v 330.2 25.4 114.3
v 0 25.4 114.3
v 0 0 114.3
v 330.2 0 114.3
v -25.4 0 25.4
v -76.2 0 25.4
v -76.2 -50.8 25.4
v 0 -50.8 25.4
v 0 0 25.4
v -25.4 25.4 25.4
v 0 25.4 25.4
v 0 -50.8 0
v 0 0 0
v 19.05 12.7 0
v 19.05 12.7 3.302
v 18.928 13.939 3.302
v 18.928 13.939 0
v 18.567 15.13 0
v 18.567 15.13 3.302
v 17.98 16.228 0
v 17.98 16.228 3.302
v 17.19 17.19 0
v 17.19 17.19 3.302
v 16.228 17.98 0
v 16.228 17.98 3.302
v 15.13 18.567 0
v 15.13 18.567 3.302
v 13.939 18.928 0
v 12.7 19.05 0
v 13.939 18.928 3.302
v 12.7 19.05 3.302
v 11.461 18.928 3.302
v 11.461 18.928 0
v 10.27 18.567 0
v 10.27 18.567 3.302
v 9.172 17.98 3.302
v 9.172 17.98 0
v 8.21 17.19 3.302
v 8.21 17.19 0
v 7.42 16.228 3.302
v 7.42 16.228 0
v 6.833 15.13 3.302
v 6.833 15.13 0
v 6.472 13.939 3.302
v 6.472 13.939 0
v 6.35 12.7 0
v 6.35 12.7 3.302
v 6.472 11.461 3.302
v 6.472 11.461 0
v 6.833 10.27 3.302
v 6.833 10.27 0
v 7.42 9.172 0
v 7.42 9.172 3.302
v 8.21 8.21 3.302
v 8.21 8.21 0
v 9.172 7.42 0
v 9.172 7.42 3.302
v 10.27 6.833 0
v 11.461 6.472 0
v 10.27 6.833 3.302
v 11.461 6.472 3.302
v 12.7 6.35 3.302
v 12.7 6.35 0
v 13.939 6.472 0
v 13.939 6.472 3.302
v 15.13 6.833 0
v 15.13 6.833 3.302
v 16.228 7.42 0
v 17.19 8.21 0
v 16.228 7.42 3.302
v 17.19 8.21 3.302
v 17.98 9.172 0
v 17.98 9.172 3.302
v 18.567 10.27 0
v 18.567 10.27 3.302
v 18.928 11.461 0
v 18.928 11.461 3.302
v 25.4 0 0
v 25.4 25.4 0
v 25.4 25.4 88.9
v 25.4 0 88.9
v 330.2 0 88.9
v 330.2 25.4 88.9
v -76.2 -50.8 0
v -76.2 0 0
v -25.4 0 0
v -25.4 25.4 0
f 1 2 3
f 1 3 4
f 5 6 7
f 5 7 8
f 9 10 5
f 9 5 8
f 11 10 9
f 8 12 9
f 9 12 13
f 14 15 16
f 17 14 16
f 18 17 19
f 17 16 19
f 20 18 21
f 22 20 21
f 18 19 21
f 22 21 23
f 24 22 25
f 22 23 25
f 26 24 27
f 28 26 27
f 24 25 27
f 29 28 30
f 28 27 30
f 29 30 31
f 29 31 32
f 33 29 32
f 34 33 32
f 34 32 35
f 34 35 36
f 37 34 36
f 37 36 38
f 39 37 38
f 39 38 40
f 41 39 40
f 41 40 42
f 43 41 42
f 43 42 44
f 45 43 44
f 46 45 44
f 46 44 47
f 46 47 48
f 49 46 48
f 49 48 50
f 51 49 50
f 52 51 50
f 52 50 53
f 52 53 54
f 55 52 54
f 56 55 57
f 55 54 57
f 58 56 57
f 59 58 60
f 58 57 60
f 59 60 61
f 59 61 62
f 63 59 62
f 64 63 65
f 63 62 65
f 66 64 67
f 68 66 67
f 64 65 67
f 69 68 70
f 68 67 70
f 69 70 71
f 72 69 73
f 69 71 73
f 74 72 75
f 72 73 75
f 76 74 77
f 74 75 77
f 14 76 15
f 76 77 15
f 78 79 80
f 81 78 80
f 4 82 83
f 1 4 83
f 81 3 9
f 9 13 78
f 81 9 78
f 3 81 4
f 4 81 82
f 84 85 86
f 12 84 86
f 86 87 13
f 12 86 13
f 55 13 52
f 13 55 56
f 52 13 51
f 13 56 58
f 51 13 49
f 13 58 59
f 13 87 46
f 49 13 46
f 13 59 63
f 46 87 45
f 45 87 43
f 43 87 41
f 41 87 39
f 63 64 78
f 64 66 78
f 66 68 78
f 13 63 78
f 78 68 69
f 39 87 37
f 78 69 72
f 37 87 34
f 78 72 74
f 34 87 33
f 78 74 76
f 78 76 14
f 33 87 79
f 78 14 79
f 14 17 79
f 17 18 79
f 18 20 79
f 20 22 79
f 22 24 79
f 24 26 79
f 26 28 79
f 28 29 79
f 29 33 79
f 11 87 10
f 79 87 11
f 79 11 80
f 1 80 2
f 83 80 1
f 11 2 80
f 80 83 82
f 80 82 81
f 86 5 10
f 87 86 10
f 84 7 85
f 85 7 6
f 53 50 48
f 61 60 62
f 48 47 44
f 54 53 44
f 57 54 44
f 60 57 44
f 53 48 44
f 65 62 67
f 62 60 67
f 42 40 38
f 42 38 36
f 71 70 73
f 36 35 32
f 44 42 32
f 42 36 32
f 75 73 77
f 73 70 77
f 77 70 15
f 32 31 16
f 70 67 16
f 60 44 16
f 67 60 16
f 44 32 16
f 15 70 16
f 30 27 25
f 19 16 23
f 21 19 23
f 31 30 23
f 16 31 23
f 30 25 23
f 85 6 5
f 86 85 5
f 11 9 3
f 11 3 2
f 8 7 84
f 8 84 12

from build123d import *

# Parameters (mm, degrees)
SKETCH1_W           = 406.4
SKETCH1_H           = 76.2
BOSS_EXTRUDE1_DEPTH = 25.4
SKETCH2_W           = 330.2
SKETCH2_H           = 50.8
CUT_EXTRUDE1_DEPTH  = 336.04901134
SKETCH3_W           = 330.2
SKETCH3_H           = 25.4
BOSS_EXTRUDE2_DEPTH = 88.9
SKETCH4_W           = 50.8
SKETCH4_H           = 25.4
CUT_EXTRUDE2_DEPTH  = 346.710702756
SKETCH5_W           = 304.8
SKETCH5_H           = 88.9
CUT_EXTRUDE3_DEPTH  = 358.635247144
HOLE1_D             = 12.7
HOLE1_DEPTH         = 3.302


with BuildPart() as part:
    # Sketch1 → Boss-Extrude1 (new body)
    with BuildSketch(Plane.XY.offset(25.4)):
        with Locations((127, -12.7)):
            Rectangle(SKETCH1_W, SKETCH1_H)
    extrude(amount=-BOSS_EXTRUDE1_DEPTH)

    # Sketch2 → Cut-Extrude1 (cut, through all)
    with BuildSketch(Plane(origin=(0, 0, 0), x_dir=(-1, 0, 0), z_dir=(0, 0, -1))):
        with Locations((-165.1, -25.4)):
            Rectangle(SKETCH2_W, SKETCH2_H)
    extrude(amount=-CUT_EXTRUDE1_DEPTH, mode=Mode.SUBTRACT)

    # Sketch3 → Boss-Extrude2 (add)
    with BuildSketch(Plane.XY.offset(25.4)):
        with Locations((165.1, 12.7)):
            Rectangle(SKETCH3_W, SKETCH3_H)
    extrude(amount=BOSS_EXTRUDE2_DEPTH)

    # Sketch4 → Cut-Extrude2 (cut, through all)
    with BuildSketch(Plane.XY.offset(25.4)):
        with Locations((-50.8, 12.7)):
            Rectangle(SKETCH4_W, SKETCH4_H)
    extrude(amount=-CUT_EXTRUDE2_DEPTH, mode=Mode.SUBTRACT)

    # Sketch5 → Cut-Extrude3 (cut, through all)
    with BuildSketch(Plane(origin=(0, 25.4, 0), x_dir=(-1, 0, 0), z_dir=(0, 1, 0))):
        with Locations((-177.8, 44.45)):
            Rectangle(SKETCH5_W, SKETCH5_H)
    extrude(amount=-CUT_EXTRUDE3_DEPTH, mode=Mode.SUBTRACT)

    # Hole1
    with Locations(Plane(origin=(0, 0, 0), x_dir=(-1, 0, 0), z_dir=(0, 0, -1))):
        with Locations((-12.7, 12.7)):
            Hole(HOLE1_D / 2, depth=HOLE1_DEPTH)


solid = part.part
